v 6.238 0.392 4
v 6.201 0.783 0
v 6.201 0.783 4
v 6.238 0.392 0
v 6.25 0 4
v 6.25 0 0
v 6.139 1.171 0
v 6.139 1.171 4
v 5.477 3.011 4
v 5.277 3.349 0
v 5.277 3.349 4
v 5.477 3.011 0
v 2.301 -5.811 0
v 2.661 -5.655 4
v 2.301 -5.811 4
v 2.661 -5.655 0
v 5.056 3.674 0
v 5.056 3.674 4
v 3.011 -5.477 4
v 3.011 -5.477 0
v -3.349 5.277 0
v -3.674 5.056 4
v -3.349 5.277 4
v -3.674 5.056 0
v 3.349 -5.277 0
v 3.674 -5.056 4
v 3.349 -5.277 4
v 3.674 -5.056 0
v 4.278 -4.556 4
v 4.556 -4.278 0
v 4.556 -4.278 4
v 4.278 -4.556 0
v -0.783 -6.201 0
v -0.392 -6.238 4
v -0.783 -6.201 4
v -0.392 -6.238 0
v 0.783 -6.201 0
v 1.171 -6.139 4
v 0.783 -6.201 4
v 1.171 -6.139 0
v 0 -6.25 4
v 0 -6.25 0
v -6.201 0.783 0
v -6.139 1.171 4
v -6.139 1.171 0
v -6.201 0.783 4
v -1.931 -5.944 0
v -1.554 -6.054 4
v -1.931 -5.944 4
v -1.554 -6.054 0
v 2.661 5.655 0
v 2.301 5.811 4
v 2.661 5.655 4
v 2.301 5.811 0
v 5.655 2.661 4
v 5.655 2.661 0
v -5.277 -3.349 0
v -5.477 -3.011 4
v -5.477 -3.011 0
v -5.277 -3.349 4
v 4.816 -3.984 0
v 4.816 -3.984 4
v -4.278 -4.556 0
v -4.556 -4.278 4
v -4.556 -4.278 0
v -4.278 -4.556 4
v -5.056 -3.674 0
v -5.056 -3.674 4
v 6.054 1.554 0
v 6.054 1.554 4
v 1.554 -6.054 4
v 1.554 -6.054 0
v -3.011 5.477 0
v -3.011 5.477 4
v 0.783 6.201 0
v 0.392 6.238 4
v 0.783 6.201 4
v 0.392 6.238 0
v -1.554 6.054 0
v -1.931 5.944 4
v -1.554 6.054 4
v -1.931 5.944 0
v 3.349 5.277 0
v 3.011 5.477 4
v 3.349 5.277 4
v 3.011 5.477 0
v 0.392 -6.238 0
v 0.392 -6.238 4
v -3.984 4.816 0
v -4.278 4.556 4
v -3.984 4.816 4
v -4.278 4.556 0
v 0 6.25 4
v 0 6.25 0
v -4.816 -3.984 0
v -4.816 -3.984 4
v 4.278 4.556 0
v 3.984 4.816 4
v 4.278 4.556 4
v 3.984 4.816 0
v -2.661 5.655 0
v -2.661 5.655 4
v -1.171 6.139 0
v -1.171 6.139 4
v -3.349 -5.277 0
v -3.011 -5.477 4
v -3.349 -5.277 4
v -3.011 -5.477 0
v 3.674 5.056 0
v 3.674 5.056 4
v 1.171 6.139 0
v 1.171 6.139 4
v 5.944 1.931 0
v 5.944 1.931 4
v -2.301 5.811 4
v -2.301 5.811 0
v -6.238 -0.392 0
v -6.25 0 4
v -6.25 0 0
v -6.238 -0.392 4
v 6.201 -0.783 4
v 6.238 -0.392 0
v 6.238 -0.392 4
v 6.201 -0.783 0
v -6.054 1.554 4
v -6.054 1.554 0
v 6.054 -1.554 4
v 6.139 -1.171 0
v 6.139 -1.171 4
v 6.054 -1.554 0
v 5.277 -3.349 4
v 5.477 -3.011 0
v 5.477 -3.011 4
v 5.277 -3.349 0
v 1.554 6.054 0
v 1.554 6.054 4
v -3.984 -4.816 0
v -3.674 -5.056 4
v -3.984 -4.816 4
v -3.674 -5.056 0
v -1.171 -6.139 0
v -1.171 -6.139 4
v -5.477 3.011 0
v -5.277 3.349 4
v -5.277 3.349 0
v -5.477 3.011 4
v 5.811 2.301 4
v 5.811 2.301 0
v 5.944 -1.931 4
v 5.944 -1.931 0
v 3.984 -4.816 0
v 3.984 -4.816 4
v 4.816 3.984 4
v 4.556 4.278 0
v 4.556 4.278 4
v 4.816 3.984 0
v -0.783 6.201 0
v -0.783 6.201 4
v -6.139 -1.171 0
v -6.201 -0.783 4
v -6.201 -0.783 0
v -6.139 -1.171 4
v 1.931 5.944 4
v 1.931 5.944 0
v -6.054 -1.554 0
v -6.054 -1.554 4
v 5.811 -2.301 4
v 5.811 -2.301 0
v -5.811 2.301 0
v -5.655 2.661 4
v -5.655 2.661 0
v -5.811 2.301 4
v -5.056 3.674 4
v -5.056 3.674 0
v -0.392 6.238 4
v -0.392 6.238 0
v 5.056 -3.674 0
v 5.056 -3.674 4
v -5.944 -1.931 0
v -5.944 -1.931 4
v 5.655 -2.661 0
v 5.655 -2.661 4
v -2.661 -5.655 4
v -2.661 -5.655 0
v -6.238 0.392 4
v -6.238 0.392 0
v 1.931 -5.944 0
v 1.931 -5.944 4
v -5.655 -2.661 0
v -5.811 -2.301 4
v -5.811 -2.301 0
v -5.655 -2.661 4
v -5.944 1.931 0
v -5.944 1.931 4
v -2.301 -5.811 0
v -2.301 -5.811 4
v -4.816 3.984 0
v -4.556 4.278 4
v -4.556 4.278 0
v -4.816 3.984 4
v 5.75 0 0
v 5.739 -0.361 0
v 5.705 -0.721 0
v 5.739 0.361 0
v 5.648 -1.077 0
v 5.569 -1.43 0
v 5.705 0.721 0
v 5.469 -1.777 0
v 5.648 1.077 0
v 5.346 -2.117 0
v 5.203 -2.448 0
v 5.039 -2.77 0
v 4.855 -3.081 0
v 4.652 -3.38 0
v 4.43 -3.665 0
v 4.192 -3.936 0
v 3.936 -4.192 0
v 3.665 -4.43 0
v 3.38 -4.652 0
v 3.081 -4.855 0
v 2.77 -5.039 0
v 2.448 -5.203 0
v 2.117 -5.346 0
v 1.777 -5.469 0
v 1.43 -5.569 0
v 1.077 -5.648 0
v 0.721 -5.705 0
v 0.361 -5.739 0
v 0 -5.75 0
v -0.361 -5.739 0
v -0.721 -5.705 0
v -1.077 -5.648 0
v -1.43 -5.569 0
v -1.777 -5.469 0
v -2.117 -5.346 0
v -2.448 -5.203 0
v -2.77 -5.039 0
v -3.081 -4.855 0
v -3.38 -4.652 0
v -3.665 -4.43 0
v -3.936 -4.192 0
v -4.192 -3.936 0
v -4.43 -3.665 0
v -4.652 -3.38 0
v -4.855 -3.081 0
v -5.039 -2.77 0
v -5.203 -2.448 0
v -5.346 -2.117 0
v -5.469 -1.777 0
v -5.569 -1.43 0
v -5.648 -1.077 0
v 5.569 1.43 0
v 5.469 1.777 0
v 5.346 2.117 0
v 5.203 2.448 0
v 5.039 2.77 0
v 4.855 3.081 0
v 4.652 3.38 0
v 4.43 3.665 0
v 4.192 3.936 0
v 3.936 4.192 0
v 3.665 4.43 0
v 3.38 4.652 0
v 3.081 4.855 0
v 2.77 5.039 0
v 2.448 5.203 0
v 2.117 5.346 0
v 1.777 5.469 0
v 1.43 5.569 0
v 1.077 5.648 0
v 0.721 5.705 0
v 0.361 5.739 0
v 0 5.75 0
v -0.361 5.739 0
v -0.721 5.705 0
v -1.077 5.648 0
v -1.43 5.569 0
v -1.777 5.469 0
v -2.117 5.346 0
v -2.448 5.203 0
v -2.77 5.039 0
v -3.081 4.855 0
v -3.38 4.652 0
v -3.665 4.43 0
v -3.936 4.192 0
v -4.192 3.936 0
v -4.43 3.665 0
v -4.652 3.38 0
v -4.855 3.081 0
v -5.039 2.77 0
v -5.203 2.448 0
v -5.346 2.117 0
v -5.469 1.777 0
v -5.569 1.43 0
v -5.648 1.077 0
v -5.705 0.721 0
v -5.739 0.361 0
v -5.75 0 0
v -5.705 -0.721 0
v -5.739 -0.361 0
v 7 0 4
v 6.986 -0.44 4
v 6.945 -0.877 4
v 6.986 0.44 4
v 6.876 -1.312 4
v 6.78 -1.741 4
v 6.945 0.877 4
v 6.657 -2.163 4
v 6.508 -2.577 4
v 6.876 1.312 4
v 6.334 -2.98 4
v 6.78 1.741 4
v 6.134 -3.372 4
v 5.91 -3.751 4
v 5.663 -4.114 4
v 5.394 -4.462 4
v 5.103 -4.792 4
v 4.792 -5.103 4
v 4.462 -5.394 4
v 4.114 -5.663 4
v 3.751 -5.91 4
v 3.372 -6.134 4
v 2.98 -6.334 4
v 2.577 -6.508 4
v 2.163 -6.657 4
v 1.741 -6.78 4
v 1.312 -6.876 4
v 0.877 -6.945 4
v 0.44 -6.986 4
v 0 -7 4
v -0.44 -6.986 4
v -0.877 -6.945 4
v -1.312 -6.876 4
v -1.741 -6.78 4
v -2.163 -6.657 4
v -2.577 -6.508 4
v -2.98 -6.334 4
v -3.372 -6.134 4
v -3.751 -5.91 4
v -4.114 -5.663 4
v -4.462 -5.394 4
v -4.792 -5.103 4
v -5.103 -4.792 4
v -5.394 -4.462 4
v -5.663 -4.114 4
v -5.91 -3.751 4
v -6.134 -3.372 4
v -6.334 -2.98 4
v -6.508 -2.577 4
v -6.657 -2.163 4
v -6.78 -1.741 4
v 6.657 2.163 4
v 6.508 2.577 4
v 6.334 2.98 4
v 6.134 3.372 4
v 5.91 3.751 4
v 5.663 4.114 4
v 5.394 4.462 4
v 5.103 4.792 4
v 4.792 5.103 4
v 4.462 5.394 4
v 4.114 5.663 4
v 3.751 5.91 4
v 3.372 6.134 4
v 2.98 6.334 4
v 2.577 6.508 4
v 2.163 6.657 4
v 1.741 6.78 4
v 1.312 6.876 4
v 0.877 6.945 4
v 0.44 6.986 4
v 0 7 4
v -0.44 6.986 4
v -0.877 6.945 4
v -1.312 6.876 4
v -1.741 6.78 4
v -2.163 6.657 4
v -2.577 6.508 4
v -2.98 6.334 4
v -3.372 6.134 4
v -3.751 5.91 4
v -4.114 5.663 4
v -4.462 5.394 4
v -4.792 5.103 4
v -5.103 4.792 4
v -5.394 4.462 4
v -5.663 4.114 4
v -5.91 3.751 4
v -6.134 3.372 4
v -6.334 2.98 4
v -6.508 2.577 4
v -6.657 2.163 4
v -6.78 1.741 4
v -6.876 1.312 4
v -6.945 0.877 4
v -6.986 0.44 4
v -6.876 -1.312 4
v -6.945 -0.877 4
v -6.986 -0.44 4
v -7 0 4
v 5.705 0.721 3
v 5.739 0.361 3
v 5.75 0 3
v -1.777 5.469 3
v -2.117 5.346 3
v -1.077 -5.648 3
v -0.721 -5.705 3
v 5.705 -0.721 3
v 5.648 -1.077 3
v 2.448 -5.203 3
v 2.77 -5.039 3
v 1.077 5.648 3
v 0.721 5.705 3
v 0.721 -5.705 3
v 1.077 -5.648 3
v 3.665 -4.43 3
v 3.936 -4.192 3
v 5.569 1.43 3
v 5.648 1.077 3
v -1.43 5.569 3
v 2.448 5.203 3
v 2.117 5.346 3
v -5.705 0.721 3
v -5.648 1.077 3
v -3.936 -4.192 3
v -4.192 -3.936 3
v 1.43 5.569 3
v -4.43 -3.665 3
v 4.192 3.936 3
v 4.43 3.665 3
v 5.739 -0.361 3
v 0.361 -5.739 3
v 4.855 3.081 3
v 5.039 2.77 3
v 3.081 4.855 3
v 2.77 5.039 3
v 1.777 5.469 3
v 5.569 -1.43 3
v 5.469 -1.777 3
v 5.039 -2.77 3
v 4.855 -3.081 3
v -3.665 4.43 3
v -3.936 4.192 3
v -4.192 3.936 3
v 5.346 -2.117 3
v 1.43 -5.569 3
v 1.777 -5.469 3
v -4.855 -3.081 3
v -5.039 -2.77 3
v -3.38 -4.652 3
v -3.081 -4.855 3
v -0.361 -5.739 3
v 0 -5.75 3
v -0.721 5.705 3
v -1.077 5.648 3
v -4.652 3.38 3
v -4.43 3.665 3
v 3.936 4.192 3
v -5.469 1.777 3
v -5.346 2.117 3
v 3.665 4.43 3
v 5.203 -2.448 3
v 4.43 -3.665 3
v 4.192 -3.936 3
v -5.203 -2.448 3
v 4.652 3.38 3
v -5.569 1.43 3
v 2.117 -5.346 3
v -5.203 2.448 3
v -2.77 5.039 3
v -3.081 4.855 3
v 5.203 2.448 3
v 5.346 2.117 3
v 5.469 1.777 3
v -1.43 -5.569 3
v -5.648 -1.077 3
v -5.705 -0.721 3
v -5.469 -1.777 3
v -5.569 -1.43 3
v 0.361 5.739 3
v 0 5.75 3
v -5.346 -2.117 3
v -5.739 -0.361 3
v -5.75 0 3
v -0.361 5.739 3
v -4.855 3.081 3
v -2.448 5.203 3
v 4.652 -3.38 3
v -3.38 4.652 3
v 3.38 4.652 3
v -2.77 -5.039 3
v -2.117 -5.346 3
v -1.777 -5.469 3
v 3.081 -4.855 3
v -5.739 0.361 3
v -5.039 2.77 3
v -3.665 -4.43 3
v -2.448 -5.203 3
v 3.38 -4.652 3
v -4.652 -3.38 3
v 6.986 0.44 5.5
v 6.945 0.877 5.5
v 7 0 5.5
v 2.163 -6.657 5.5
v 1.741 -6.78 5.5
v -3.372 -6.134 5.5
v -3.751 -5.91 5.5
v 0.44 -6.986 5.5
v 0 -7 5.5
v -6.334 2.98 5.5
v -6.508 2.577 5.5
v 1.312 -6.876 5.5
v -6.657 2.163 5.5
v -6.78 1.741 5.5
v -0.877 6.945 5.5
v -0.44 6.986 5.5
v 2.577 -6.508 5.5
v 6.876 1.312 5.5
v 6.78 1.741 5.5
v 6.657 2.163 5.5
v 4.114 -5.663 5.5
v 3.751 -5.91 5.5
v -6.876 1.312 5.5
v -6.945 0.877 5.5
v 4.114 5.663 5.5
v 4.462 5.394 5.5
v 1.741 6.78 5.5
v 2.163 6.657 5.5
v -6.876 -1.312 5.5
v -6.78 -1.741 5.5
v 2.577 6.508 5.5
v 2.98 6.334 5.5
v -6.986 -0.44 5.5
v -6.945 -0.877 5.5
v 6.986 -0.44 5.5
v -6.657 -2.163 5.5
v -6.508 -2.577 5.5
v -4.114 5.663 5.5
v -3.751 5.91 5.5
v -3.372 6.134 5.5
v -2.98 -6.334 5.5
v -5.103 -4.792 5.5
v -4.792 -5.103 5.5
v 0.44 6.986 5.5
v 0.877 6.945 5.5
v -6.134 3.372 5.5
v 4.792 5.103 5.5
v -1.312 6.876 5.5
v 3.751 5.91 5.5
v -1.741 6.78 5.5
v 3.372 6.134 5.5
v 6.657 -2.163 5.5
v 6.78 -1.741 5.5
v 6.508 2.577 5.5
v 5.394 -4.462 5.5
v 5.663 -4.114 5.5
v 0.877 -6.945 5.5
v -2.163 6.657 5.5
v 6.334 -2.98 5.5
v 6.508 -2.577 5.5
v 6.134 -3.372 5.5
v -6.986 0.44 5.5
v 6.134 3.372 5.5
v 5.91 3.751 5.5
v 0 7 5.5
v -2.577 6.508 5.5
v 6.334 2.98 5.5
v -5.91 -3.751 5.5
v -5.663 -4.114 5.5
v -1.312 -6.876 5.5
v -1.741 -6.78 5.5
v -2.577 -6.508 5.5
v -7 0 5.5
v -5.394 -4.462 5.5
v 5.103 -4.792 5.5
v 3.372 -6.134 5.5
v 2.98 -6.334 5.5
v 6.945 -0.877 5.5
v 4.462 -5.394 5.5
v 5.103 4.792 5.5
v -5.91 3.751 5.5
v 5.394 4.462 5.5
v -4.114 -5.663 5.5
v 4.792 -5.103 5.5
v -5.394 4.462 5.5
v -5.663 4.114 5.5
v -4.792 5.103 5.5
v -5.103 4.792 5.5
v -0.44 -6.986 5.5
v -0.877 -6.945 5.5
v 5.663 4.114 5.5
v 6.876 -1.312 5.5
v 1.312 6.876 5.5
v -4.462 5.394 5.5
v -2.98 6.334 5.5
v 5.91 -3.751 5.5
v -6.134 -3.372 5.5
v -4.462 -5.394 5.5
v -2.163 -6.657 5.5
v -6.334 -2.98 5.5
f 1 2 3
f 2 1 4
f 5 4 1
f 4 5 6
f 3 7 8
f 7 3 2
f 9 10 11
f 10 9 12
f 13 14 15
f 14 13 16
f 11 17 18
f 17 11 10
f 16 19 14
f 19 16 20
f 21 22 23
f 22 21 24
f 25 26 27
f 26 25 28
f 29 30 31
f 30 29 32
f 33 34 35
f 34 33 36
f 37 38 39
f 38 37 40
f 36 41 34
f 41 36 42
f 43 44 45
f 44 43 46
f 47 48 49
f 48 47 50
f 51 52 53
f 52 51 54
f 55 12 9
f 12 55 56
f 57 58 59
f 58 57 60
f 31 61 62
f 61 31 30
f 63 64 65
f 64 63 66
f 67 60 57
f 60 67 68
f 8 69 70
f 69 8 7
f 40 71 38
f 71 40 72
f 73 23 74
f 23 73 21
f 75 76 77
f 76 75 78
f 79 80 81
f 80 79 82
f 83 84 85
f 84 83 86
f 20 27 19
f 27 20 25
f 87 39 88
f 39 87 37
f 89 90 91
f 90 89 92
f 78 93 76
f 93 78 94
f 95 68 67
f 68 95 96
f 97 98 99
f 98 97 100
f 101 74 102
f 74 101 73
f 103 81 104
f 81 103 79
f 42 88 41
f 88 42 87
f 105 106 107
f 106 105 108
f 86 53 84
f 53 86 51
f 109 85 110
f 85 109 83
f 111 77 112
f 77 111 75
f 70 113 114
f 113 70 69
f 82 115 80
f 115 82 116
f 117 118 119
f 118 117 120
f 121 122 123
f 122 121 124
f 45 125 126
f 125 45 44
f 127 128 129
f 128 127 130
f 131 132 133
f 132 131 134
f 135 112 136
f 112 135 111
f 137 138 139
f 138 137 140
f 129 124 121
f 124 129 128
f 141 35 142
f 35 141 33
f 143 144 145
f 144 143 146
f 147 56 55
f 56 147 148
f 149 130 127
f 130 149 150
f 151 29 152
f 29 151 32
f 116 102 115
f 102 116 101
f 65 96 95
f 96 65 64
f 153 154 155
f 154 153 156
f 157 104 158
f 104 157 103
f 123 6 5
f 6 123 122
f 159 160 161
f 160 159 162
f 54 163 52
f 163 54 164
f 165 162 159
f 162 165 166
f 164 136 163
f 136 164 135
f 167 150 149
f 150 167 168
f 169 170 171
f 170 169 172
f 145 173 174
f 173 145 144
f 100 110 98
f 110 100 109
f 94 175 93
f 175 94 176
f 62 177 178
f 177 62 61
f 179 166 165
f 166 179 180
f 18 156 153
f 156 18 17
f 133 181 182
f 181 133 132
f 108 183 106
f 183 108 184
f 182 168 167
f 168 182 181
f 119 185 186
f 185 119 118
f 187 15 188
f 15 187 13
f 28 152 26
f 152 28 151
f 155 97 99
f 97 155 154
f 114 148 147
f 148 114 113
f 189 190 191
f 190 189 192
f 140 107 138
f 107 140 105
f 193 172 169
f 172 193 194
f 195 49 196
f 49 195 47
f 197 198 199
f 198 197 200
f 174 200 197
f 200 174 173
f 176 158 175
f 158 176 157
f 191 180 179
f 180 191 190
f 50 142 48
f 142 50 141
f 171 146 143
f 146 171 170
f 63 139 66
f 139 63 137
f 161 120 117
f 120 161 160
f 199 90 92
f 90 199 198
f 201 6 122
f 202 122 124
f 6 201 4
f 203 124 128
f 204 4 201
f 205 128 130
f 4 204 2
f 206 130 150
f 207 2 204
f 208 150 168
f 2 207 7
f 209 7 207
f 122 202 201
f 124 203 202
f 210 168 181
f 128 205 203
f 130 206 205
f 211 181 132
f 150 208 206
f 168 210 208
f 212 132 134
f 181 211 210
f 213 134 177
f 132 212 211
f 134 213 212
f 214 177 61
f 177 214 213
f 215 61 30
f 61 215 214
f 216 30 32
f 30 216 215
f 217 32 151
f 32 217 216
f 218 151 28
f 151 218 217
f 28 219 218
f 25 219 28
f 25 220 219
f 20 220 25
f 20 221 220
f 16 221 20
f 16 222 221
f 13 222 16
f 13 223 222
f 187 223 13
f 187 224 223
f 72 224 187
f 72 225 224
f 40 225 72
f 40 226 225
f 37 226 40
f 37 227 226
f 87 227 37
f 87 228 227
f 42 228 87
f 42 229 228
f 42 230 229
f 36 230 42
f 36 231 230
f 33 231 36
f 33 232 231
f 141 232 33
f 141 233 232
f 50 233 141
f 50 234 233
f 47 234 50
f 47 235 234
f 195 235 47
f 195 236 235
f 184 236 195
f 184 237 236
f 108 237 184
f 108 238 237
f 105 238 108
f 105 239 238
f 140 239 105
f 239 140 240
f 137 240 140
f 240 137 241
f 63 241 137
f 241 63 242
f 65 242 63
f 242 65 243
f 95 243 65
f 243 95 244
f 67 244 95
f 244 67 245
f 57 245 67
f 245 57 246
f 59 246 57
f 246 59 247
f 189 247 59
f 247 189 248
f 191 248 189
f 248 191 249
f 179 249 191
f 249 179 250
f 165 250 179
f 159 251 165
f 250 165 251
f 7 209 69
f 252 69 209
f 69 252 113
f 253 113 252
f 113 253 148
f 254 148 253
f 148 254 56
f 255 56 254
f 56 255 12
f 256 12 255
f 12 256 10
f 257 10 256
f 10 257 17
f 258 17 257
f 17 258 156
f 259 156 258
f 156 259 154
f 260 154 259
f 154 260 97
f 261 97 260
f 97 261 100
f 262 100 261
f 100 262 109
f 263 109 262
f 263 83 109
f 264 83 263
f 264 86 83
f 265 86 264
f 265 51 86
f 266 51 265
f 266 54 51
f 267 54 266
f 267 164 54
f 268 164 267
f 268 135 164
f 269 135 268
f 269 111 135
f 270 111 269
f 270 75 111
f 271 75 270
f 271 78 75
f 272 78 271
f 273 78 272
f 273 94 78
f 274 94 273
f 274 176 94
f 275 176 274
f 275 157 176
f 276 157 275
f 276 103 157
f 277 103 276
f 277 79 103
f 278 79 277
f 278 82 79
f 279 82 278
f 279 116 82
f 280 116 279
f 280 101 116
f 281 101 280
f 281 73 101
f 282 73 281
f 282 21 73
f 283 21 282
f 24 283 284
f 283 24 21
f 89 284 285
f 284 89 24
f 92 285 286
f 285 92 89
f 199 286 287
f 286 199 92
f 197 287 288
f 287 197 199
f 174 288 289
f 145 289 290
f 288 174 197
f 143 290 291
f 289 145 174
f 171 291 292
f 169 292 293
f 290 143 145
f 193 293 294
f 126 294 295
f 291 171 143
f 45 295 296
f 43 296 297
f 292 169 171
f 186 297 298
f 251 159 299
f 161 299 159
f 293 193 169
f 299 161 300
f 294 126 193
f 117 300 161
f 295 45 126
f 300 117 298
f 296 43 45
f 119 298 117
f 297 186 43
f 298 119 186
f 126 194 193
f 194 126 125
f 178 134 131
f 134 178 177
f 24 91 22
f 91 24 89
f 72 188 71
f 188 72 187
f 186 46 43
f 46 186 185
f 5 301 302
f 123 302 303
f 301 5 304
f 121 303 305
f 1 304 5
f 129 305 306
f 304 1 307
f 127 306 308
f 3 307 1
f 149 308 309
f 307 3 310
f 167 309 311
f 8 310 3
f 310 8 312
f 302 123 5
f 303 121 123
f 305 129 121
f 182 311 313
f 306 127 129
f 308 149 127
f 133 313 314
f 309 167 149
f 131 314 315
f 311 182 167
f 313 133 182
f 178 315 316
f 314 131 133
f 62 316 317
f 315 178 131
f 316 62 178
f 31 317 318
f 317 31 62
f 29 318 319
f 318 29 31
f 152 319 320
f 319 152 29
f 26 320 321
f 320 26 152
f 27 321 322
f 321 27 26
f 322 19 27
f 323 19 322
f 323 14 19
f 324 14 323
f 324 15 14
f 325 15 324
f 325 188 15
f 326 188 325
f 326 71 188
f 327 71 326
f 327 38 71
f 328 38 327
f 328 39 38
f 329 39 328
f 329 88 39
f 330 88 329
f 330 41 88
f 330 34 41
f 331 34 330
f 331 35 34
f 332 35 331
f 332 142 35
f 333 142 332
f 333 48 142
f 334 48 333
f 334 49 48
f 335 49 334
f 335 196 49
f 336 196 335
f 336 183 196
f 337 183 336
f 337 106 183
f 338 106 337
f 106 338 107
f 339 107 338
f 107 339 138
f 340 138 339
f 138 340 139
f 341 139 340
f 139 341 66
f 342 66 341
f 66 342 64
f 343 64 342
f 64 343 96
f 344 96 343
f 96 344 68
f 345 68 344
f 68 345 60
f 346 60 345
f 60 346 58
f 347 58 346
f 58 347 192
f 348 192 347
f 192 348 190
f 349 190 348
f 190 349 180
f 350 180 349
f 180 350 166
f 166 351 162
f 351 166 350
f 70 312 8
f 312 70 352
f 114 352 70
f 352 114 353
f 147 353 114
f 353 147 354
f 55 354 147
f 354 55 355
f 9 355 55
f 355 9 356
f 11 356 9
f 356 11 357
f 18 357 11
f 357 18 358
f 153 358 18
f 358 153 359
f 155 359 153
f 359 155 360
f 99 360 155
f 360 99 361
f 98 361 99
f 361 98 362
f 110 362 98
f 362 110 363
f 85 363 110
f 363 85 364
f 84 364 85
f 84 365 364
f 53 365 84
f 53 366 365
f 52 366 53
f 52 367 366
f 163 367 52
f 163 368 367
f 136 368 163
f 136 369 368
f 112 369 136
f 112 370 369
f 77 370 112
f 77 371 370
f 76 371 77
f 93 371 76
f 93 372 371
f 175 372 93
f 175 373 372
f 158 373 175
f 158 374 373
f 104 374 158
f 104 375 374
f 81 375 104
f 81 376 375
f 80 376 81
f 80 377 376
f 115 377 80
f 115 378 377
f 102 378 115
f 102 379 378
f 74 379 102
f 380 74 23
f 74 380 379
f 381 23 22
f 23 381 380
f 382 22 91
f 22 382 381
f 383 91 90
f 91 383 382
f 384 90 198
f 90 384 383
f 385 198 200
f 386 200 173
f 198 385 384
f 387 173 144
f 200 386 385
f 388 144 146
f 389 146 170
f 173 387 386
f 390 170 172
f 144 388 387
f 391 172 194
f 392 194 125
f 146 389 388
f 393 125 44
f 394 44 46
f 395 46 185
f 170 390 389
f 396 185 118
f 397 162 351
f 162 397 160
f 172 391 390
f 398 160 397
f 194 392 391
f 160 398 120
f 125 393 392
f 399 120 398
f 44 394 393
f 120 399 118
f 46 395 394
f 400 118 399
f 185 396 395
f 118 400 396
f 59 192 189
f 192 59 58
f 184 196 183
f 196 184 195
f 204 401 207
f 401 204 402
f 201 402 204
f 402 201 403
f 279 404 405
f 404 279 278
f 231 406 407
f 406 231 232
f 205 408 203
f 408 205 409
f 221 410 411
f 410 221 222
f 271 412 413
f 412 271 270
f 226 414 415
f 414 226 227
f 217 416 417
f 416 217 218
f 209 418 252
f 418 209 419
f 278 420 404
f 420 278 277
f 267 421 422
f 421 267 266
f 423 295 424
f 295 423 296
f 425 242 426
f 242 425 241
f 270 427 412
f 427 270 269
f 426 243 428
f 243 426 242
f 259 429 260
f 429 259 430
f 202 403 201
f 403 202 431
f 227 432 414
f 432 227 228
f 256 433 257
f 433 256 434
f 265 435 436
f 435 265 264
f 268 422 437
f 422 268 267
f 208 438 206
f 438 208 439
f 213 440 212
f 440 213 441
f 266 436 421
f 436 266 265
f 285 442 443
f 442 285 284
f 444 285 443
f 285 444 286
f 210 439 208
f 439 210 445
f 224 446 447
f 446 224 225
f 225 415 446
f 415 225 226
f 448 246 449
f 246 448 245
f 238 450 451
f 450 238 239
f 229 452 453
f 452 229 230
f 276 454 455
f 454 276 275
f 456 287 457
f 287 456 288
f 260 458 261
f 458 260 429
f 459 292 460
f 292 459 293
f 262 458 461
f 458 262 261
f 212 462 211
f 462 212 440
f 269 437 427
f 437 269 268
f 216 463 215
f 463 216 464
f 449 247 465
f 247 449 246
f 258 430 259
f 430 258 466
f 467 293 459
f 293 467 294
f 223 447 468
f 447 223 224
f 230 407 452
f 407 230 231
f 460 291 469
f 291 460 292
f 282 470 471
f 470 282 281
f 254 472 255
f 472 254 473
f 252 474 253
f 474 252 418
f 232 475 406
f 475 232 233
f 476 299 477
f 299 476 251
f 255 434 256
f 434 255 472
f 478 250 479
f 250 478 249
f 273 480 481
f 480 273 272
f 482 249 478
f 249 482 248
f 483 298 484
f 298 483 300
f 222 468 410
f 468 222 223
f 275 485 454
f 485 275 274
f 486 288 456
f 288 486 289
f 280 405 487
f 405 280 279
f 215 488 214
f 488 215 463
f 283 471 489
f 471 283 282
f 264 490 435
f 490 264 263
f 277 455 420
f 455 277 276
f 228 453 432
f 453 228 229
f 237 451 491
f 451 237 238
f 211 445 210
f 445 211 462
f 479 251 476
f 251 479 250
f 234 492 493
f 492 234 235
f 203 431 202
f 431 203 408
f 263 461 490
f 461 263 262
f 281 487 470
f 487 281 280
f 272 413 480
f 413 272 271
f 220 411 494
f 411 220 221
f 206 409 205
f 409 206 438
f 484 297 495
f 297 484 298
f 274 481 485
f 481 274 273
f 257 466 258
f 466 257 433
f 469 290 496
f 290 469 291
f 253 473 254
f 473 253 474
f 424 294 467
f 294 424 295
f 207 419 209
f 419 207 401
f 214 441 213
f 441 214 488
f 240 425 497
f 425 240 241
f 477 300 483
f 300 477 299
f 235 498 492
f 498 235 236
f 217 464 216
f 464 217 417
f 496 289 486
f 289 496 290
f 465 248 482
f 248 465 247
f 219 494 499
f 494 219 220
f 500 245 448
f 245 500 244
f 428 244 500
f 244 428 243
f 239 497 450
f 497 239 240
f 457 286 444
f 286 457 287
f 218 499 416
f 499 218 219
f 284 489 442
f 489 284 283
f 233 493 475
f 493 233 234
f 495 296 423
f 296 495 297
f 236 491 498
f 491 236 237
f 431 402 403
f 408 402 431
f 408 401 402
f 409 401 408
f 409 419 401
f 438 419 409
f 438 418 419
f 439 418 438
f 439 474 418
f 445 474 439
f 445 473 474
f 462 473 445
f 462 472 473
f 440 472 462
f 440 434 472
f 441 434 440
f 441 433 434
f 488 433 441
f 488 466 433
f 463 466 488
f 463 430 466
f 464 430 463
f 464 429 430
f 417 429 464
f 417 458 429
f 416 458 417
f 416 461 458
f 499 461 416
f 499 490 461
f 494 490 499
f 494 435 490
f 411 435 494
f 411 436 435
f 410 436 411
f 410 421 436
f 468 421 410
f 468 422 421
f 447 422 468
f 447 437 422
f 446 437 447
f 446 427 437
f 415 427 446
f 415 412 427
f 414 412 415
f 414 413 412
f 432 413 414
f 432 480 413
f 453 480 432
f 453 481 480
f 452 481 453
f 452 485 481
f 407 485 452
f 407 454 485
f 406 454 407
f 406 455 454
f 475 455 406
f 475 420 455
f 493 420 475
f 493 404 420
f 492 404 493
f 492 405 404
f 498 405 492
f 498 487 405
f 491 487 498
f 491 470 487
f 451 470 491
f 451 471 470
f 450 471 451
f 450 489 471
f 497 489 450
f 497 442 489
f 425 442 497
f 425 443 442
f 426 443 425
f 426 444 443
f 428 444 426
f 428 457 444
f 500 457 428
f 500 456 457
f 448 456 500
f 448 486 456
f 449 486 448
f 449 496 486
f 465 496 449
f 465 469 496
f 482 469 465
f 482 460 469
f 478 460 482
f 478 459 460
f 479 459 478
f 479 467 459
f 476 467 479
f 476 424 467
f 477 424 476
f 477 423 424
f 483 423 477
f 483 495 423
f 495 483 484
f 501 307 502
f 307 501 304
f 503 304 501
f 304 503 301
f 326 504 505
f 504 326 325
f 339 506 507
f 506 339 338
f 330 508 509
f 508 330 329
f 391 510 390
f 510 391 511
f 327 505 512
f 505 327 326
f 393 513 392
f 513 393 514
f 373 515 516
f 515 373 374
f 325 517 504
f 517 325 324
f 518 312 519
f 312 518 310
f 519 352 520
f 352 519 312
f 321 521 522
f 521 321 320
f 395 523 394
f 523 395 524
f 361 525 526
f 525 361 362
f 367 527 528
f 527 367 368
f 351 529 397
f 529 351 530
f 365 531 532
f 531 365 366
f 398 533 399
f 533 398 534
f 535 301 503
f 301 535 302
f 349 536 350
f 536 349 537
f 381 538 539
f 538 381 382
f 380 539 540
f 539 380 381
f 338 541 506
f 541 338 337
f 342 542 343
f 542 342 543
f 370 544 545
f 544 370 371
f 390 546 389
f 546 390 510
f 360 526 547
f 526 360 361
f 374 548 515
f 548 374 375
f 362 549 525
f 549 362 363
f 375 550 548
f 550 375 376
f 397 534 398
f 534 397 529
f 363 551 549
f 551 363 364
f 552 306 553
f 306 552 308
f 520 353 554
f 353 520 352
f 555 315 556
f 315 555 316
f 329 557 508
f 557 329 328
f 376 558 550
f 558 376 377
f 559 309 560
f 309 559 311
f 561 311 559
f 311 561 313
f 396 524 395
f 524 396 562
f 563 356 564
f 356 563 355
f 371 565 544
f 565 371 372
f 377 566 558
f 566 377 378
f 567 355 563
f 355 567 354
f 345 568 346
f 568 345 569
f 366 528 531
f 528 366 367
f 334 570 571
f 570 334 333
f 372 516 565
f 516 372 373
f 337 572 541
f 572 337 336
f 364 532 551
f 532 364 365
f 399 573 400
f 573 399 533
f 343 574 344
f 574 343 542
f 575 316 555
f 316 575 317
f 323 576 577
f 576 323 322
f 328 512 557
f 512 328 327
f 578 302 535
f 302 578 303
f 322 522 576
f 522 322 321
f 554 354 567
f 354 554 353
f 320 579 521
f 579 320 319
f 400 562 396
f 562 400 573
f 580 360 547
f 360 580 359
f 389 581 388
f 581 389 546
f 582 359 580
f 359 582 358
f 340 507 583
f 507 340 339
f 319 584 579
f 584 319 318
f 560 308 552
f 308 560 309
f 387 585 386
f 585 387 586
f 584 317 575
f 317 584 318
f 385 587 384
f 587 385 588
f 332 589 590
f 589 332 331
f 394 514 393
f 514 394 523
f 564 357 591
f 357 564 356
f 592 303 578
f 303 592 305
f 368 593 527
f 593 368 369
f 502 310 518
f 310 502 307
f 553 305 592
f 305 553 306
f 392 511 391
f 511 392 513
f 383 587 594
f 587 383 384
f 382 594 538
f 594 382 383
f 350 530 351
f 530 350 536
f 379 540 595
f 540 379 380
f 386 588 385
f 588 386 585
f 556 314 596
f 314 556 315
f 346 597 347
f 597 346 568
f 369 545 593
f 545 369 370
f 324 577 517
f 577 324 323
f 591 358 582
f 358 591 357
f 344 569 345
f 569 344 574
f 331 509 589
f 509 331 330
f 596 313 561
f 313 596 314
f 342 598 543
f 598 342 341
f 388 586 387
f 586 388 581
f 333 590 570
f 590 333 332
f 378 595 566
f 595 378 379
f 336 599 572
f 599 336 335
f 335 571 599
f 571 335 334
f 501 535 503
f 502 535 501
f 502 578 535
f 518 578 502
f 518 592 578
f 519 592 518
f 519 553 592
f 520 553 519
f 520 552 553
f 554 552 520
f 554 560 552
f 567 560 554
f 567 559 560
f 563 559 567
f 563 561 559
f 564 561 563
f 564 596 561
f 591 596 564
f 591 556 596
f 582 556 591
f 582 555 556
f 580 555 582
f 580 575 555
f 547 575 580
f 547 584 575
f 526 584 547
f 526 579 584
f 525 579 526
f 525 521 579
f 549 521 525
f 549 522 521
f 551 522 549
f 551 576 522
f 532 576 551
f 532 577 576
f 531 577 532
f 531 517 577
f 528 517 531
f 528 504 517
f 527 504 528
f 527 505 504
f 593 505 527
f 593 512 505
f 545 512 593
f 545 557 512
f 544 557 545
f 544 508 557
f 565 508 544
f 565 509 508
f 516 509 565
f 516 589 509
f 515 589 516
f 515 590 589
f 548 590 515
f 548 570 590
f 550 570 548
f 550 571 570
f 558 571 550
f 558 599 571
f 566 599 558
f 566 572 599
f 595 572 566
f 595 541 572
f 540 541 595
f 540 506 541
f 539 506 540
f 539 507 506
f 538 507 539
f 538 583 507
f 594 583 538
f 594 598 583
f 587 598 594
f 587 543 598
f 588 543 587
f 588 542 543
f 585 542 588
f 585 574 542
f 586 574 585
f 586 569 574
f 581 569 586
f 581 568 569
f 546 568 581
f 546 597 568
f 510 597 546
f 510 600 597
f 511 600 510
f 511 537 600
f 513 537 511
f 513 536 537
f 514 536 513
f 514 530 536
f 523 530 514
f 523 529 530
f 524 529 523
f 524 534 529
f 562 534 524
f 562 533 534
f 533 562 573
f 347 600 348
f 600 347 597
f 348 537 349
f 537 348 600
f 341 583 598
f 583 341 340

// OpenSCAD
inner_diam=12.5;
outer_diam=14;
inner_wall=1;
$fn=100;

translate([0,0,4]) cylinder(d=outer_diam,h=1.5);
difference() {
    cylinder(d=inner_diam,h=4);
    translate([0,0,-1]) cylinder(d=inner_diam-inner_wall,h=4);
}
